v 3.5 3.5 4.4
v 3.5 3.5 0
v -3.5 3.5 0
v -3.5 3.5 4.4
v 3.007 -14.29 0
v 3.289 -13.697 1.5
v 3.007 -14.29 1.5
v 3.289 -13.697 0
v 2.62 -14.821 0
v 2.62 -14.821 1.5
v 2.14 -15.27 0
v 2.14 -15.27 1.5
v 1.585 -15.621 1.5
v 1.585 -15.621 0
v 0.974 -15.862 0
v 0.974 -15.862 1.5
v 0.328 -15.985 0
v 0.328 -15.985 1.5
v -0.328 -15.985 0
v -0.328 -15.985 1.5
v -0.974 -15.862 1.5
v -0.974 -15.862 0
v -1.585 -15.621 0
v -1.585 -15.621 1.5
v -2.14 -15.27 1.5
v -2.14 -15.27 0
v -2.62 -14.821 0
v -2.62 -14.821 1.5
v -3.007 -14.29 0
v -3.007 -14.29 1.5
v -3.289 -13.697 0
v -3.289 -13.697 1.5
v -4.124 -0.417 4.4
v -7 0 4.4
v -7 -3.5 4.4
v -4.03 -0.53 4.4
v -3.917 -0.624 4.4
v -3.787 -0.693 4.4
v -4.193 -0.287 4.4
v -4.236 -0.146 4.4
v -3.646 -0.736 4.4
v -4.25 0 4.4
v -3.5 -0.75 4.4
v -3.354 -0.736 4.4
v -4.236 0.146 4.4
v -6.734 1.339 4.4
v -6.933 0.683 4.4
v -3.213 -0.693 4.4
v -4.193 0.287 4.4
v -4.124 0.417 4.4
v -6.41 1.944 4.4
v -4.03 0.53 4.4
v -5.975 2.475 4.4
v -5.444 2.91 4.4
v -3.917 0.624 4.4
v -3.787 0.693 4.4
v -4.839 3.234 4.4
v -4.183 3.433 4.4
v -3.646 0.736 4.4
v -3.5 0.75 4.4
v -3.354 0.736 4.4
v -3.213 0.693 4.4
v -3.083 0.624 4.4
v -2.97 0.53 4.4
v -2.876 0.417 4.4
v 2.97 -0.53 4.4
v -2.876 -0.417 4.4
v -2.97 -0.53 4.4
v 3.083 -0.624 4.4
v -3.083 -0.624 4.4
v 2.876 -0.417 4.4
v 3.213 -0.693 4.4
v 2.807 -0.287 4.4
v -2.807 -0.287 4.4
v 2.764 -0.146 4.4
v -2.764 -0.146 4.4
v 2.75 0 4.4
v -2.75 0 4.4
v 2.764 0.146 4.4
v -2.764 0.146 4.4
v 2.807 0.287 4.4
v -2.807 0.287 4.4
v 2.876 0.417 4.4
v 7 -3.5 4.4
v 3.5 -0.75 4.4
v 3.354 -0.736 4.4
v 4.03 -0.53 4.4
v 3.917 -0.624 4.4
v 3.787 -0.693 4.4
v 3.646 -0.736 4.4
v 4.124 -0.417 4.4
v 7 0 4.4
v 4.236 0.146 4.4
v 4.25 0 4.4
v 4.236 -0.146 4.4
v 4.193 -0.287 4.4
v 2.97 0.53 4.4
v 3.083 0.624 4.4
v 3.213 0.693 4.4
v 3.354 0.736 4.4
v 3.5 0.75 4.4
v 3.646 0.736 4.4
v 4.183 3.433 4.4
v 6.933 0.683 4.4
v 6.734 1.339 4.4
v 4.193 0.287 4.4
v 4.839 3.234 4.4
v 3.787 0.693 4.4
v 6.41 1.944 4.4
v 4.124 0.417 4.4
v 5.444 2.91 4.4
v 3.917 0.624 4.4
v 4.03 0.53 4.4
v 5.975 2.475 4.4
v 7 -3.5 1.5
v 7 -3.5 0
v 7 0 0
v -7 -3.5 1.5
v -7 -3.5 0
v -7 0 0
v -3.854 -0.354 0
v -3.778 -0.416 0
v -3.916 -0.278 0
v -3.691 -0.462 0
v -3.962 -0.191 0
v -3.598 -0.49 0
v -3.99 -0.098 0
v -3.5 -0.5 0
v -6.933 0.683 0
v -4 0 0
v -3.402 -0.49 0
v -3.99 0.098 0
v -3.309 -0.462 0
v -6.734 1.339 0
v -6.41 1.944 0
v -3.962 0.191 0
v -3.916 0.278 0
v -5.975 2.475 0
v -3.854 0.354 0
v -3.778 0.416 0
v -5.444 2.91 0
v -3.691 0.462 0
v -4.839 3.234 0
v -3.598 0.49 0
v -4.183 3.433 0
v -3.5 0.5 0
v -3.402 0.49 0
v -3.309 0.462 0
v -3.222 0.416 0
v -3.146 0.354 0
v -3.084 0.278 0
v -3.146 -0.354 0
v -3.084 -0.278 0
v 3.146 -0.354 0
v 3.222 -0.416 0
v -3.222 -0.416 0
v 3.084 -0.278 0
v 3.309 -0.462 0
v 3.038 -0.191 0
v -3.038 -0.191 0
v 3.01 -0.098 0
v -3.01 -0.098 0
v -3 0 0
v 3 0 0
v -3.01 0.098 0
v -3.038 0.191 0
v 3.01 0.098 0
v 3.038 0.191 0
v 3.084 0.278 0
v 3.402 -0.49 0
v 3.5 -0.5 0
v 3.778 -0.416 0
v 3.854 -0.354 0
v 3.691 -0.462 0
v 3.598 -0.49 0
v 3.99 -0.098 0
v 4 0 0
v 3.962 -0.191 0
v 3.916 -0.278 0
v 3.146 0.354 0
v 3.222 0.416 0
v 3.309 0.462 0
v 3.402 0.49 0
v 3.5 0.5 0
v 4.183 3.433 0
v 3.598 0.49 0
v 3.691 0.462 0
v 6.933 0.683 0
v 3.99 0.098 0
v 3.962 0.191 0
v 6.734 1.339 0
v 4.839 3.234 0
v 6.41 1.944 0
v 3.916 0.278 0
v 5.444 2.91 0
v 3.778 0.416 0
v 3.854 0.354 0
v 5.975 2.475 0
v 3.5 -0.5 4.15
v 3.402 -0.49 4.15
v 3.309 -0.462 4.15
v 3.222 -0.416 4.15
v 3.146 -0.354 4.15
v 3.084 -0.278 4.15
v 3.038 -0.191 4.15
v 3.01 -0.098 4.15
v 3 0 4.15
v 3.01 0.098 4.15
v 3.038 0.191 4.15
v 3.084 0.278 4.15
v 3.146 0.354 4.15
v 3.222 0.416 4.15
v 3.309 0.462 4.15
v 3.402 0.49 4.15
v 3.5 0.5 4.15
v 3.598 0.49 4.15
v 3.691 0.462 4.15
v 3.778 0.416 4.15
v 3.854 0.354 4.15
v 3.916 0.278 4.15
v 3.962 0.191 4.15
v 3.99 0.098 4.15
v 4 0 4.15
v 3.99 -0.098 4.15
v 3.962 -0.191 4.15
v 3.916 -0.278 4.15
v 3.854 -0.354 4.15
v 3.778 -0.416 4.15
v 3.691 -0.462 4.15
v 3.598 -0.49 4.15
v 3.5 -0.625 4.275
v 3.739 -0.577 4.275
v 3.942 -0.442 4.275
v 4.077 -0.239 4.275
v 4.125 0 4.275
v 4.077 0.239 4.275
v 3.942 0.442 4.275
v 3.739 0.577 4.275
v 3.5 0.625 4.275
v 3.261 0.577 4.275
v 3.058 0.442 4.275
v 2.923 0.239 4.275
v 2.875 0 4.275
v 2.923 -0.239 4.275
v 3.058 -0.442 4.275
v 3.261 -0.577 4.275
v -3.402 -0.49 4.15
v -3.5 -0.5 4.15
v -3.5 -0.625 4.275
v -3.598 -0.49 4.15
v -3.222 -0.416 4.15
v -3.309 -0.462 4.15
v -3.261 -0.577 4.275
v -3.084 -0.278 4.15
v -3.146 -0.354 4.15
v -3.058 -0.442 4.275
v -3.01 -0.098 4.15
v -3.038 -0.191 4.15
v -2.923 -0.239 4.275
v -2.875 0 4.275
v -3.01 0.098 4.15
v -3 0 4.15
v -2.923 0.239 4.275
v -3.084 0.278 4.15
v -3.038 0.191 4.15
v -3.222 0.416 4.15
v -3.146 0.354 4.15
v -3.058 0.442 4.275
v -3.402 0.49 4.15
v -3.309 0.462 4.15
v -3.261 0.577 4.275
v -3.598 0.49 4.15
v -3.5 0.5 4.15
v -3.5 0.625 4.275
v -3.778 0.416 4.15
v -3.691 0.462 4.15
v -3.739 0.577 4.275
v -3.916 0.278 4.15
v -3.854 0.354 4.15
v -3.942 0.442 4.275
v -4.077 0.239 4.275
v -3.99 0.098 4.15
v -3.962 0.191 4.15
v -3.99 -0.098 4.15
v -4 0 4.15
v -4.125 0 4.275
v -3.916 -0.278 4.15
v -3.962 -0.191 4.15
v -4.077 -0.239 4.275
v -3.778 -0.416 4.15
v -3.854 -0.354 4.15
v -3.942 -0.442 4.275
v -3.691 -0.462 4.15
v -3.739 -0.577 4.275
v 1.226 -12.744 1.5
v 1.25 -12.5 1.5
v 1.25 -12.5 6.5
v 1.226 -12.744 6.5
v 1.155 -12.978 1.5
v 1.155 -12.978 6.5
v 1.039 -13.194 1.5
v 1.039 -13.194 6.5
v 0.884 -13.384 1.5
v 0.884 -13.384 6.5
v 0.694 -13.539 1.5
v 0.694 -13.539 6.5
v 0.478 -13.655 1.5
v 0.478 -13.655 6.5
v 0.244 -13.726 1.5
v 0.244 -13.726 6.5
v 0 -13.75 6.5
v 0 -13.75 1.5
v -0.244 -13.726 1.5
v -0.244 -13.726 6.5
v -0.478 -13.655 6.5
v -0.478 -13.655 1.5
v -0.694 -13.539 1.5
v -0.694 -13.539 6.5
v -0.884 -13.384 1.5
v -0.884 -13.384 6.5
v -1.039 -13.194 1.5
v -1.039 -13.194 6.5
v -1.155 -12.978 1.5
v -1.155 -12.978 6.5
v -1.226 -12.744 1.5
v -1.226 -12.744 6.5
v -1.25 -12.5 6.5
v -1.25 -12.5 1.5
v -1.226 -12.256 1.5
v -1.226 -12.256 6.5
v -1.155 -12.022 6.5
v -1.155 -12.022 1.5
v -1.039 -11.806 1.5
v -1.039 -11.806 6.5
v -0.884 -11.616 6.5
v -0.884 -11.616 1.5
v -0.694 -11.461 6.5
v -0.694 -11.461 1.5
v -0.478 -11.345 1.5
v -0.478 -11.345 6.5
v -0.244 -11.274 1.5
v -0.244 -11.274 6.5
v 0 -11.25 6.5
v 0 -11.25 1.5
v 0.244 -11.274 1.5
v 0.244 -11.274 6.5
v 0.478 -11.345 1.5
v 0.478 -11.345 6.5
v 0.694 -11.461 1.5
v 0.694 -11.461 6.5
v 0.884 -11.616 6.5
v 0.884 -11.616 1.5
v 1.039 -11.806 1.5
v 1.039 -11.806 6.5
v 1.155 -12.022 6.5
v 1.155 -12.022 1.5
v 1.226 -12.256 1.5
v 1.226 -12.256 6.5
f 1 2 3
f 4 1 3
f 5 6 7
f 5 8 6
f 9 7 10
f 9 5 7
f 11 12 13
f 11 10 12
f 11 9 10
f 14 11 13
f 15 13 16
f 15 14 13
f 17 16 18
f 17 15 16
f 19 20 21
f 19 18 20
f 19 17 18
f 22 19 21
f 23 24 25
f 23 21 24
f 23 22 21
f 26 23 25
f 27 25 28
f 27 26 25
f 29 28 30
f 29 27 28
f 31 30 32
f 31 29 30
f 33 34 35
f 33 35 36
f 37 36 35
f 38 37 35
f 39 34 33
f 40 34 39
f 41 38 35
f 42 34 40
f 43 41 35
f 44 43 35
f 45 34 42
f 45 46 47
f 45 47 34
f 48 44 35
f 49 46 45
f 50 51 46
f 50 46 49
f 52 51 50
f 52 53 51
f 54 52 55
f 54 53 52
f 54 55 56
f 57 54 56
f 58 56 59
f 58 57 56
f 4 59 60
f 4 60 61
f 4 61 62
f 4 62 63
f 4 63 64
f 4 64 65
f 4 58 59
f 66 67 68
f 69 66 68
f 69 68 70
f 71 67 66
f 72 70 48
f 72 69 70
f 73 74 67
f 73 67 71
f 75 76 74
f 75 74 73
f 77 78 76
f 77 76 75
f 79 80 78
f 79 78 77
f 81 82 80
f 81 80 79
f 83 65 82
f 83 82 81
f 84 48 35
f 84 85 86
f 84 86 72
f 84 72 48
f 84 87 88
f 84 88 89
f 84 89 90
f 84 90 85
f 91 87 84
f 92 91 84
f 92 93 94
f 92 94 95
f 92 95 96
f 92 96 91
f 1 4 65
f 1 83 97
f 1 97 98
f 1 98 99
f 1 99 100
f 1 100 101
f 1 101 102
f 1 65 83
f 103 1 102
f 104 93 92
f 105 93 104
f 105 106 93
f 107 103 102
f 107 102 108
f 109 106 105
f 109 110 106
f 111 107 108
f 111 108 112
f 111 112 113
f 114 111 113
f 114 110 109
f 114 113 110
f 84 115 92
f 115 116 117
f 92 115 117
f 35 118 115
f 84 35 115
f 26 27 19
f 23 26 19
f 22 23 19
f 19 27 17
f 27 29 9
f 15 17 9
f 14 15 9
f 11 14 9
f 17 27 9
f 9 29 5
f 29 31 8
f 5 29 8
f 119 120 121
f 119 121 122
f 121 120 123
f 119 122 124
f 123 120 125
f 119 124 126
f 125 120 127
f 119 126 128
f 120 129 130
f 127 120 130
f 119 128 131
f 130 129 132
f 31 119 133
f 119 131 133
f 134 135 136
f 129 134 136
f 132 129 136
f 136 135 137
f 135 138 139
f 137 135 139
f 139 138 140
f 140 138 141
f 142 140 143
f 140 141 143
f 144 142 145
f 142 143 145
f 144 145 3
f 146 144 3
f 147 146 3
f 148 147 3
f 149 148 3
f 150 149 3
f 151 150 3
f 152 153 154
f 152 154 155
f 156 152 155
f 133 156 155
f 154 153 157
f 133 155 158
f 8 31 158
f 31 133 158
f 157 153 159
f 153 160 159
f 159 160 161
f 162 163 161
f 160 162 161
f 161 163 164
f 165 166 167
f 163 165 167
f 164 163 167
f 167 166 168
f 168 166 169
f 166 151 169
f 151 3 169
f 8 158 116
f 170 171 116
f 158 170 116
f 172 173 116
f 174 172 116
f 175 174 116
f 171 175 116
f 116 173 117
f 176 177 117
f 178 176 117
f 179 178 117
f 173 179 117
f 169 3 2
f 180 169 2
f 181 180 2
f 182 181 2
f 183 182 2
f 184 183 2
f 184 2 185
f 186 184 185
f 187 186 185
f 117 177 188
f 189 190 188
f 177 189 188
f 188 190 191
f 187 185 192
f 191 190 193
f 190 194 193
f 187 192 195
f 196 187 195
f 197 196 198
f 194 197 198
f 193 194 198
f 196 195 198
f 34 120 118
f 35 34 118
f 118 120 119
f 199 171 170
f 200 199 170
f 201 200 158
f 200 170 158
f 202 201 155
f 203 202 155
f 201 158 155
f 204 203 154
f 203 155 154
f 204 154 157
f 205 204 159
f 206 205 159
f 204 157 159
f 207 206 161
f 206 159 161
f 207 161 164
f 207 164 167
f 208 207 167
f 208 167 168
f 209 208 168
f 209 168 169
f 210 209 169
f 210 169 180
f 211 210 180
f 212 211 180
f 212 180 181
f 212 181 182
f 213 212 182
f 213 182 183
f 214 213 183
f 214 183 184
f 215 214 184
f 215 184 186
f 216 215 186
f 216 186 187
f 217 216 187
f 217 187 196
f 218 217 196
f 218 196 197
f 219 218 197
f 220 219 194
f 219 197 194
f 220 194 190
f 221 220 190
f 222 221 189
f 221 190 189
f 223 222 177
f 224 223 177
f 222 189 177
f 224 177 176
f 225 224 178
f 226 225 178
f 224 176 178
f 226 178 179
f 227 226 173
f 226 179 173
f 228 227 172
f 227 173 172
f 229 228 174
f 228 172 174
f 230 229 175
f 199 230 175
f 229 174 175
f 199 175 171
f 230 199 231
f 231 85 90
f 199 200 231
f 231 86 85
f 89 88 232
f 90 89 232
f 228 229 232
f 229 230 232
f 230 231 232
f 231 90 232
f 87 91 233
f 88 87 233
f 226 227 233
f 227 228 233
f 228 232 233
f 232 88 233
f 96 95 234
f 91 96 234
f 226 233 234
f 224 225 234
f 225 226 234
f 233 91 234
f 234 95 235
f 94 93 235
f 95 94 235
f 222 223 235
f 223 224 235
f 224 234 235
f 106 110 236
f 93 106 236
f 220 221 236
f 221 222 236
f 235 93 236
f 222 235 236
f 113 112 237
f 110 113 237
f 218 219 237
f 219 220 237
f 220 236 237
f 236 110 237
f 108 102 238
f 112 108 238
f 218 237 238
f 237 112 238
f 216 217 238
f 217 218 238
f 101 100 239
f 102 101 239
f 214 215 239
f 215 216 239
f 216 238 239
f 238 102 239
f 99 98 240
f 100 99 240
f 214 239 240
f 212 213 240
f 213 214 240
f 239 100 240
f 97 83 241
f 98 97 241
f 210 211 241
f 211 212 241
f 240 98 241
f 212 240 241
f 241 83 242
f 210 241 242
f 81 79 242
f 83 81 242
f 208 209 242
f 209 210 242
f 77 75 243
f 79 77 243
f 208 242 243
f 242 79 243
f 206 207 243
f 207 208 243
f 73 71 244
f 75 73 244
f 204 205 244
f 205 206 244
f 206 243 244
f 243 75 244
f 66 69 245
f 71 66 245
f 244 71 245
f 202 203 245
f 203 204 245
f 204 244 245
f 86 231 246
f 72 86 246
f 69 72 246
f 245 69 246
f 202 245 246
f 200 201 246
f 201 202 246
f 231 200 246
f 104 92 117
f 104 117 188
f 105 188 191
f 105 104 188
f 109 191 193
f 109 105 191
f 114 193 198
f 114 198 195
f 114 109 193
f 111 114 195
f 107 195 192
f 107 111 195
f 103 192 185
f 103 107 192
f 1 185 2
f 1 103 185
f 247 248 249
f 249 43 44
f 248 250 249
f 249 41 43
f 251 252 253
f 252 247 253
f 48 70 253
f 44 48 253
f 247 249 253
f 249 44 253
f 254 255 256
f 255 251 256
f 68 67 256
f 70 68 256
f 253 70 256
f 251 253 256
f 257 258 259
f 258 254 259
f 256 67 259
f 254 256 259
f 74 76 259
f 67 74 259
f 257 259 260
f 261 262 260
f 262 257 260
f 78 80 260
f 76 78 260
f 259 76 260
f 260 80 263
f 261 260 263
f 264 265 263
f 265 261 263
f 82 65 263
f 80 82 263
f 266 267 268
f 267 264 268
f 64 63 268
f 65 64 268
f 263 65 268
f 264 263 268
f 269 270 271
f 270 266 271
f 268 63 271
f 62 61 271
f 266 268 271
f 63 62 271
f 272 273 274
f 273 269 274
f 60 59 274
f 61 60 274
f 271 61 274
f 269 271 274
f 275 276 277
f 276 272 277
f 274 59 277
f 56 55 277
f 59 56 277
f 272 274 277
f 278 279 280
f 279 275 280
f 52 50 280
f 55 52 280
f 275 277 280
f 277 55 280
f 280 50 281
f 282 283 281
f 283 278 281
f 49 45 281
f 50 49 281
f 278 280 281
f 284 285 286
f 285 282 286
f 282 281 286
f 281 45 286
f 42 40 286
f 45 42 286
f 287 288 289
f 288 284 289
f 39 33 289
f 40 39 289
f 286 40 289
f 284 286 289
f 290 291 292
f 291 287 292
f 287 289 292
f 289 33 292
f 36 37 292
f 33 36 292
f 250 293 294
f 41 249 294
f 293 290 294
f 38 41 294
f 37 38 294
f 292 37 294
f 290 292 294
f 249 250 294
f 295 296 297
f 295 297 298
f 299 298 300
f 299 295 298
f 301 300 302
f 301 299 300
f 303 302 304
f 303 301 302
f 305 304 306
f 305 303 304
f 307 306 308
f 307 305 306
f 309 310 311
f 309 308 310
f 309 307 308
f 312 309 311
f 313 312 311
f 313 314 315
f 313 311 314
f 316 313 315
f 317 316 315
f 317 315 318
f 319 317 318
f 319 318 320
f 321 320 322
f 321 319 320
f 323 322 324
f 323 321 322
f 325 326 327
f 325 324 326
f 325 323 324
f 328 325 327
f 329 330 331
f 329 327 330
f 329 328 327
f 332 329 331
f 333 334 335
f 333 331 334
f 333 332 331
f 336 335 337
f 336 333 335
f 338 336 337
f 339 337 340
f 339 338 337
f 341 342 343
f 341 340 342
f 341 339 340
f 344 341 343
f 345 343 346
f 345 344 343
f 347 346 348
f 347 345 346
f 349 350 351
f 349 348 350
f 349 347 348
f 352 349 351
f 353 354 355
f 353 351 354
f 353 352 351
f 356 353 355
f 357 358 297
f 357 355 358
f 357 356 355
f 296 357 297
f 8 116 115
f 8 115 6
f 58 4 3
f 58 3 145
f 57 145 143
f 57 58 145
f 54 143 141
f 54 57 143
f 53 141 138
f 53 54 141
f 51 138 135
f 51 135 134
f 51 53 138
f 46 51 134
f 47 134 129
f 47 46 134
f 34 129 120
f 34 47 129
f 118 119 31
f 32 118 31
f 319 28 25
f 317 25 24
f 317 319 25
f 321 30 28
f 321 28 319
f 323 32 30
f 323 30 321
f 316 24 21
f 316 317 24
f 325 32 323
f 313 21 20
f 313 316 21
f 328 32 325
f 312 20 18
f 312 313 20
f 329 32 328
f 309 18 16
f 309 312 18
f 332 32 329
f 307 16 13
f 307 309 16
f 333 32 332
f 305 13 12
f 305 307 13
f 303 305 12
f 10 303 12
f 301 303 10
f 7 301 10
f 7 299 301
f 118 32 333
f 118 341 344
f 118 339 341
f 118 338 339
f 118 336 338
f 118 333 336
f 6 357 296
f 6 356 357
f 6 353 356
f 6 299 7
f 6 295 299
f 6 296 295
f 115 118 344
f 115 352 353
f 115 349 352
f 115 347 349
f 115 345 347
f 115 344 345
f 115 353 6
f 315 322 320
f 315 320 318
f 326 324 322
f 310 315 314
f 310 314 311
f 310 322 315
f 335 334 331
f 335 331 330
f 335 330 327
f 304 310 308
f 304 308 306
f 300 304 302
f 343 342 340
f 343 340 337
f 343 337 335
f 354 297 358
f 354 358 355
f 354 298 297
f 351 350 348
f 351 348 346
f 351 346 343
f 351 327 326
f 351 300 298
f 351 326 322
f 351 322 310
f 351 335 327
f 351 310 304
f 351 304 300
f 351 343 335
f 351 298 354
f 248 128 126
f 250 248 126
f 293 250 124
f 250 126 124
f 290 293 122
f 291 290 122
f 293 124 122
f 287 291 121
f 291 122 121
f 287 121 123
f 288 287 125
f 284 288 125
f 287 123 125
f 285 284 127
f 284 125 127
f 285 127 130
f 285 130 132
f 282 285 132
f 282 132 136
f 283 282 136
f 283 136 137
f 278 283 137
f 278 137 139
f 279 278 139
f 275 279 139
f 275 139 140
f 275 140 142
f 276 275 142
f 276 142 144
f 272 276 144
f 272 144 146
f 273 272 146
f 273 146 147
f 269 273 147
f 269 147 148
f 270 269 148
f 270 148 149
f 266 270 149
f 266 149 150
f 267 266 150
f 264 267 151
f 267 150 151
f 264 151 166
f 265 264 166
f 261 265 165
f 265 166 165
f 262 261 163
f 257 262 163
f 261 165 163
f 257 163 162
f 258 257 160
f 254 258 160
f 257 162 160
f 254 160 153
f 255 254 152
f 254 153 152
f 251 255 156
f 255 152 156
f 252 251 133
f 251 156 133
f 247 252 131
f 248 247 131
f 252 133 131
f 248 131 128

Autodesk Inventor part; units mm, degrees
ref_plane "YZ Plane" through (0, 0, 0) normal (1, 0, 0) x (0, 1, 0)
ref_plane "XZ Plane" through (0, 0, 0) normal (0, 1, 0) x (-1, 0, 0)
ref_plane "XY Plane" through (0, 0, 0) normal (0, 0, 1) x (1, 0, 0)
sketch "Эскиз1" plane through (0, 0, 0) normal (0, 0, 1) x (1, 0, 0)
  line L0 (-7, -3.5) -> (7, -3.5) construction
  line L1 (7, -3.5) -> (7, 3.5)
  line L2 (7, 3.5) -> (-7, 3.5)
  line L3 (-7, 3.5) -> (-7, -3.5)
  line L4 (-7, -3.5) -> (7, 3.5) construction
  line L5 (7, -3.5) -> (-7, 3.5) construction
  line L6 (0, -3.5) -> (0, -12.5) construction
  line L7 (-7, -3.5) -> (-3.289, -13.697)
  line L8 (7, -3.5) -> (3.289, -13.697)
  arc A0 (-3.289, -13.697) -> (3.289, -13.697) centre (0, -12.5) ccw
  point P0 (0, 0)
  point P1 (0, 0)
  point P2 (0, 0)
  point P3 (0, 0)
  dimension "d0" = 14
  dimension "d1" = 7
  dimension "d4" = 9
  dimension "d5" = 3.5
extrude "Выдавливание1" add sketch "Эскиз1" along normal blind 1.5
sketch "Эскиз4" plane through (0, 0, 1.5) normal (0, 0, 1) x (1, 0, 0)
  line L0 (7, 3.5) -> (-7, 3.5) projected
  line L1 (7, -3.5) -> (7, 3.5) projected
  line L2 (-7, 3.5) -> (-7, -3.5) projected
  line L3 (-7, -3.5) -> (7, -3.5)
  point P0 (0, 0)
extrude "Выдавливание6" add sketch "Эскиз4" along normal blind 2.9
sketch "Эскиз2" plane through (0, 0, 1.5) normal (0, 0, 1) x (1, 0, 0)
  arc A0 (-3.289, -13.697) -> (3.289, -13.697) centre (0, -12.5) ccw construction
  circle A1 centre (0, -12.5) radius 1.25
  point P0 (0, 0)
  dimension "d8" = 2.5
extrude "Выдавливание9" add sketch "Эскиз2" along normal blind 5
fillet "Сопряжение1" radius 3.5 2 edges at (7, 3.5, 2.2) (-7, 3.5, 2.2)
sketch "Эскиз5" plane through (0, 0, 4.4) normal (0, 0, 1) x (1, 0, 0)
  circle A0 centre (0, -9.5) radius 1.5 construction
  line L0 (7, -3.5) -> (-7, -3.5) construction
  line L1 (0, -3.5) -> (0, 3.5) construction
  line L2 (-7, 3.5) -> (7, 3.5) construction
  circle A1 centre (3.5, 0) radius 0.5
  line L3 (3.5, 3.5) -> (3.5, 0) construction
  line L4 (3.5, 0) -> (0, 0) construction
  circle A2 centre (-3.5, 0) radius 0.5
  dimension "d34" = 1
hole "Отверстие1" at (-3.5, 0, 4.4) at (3.5, 0, 4.4) direction (0, 0, -1) diameter 1 end through all countersink diameter 1.5 countersink angle 90
properties part number "переходник"
